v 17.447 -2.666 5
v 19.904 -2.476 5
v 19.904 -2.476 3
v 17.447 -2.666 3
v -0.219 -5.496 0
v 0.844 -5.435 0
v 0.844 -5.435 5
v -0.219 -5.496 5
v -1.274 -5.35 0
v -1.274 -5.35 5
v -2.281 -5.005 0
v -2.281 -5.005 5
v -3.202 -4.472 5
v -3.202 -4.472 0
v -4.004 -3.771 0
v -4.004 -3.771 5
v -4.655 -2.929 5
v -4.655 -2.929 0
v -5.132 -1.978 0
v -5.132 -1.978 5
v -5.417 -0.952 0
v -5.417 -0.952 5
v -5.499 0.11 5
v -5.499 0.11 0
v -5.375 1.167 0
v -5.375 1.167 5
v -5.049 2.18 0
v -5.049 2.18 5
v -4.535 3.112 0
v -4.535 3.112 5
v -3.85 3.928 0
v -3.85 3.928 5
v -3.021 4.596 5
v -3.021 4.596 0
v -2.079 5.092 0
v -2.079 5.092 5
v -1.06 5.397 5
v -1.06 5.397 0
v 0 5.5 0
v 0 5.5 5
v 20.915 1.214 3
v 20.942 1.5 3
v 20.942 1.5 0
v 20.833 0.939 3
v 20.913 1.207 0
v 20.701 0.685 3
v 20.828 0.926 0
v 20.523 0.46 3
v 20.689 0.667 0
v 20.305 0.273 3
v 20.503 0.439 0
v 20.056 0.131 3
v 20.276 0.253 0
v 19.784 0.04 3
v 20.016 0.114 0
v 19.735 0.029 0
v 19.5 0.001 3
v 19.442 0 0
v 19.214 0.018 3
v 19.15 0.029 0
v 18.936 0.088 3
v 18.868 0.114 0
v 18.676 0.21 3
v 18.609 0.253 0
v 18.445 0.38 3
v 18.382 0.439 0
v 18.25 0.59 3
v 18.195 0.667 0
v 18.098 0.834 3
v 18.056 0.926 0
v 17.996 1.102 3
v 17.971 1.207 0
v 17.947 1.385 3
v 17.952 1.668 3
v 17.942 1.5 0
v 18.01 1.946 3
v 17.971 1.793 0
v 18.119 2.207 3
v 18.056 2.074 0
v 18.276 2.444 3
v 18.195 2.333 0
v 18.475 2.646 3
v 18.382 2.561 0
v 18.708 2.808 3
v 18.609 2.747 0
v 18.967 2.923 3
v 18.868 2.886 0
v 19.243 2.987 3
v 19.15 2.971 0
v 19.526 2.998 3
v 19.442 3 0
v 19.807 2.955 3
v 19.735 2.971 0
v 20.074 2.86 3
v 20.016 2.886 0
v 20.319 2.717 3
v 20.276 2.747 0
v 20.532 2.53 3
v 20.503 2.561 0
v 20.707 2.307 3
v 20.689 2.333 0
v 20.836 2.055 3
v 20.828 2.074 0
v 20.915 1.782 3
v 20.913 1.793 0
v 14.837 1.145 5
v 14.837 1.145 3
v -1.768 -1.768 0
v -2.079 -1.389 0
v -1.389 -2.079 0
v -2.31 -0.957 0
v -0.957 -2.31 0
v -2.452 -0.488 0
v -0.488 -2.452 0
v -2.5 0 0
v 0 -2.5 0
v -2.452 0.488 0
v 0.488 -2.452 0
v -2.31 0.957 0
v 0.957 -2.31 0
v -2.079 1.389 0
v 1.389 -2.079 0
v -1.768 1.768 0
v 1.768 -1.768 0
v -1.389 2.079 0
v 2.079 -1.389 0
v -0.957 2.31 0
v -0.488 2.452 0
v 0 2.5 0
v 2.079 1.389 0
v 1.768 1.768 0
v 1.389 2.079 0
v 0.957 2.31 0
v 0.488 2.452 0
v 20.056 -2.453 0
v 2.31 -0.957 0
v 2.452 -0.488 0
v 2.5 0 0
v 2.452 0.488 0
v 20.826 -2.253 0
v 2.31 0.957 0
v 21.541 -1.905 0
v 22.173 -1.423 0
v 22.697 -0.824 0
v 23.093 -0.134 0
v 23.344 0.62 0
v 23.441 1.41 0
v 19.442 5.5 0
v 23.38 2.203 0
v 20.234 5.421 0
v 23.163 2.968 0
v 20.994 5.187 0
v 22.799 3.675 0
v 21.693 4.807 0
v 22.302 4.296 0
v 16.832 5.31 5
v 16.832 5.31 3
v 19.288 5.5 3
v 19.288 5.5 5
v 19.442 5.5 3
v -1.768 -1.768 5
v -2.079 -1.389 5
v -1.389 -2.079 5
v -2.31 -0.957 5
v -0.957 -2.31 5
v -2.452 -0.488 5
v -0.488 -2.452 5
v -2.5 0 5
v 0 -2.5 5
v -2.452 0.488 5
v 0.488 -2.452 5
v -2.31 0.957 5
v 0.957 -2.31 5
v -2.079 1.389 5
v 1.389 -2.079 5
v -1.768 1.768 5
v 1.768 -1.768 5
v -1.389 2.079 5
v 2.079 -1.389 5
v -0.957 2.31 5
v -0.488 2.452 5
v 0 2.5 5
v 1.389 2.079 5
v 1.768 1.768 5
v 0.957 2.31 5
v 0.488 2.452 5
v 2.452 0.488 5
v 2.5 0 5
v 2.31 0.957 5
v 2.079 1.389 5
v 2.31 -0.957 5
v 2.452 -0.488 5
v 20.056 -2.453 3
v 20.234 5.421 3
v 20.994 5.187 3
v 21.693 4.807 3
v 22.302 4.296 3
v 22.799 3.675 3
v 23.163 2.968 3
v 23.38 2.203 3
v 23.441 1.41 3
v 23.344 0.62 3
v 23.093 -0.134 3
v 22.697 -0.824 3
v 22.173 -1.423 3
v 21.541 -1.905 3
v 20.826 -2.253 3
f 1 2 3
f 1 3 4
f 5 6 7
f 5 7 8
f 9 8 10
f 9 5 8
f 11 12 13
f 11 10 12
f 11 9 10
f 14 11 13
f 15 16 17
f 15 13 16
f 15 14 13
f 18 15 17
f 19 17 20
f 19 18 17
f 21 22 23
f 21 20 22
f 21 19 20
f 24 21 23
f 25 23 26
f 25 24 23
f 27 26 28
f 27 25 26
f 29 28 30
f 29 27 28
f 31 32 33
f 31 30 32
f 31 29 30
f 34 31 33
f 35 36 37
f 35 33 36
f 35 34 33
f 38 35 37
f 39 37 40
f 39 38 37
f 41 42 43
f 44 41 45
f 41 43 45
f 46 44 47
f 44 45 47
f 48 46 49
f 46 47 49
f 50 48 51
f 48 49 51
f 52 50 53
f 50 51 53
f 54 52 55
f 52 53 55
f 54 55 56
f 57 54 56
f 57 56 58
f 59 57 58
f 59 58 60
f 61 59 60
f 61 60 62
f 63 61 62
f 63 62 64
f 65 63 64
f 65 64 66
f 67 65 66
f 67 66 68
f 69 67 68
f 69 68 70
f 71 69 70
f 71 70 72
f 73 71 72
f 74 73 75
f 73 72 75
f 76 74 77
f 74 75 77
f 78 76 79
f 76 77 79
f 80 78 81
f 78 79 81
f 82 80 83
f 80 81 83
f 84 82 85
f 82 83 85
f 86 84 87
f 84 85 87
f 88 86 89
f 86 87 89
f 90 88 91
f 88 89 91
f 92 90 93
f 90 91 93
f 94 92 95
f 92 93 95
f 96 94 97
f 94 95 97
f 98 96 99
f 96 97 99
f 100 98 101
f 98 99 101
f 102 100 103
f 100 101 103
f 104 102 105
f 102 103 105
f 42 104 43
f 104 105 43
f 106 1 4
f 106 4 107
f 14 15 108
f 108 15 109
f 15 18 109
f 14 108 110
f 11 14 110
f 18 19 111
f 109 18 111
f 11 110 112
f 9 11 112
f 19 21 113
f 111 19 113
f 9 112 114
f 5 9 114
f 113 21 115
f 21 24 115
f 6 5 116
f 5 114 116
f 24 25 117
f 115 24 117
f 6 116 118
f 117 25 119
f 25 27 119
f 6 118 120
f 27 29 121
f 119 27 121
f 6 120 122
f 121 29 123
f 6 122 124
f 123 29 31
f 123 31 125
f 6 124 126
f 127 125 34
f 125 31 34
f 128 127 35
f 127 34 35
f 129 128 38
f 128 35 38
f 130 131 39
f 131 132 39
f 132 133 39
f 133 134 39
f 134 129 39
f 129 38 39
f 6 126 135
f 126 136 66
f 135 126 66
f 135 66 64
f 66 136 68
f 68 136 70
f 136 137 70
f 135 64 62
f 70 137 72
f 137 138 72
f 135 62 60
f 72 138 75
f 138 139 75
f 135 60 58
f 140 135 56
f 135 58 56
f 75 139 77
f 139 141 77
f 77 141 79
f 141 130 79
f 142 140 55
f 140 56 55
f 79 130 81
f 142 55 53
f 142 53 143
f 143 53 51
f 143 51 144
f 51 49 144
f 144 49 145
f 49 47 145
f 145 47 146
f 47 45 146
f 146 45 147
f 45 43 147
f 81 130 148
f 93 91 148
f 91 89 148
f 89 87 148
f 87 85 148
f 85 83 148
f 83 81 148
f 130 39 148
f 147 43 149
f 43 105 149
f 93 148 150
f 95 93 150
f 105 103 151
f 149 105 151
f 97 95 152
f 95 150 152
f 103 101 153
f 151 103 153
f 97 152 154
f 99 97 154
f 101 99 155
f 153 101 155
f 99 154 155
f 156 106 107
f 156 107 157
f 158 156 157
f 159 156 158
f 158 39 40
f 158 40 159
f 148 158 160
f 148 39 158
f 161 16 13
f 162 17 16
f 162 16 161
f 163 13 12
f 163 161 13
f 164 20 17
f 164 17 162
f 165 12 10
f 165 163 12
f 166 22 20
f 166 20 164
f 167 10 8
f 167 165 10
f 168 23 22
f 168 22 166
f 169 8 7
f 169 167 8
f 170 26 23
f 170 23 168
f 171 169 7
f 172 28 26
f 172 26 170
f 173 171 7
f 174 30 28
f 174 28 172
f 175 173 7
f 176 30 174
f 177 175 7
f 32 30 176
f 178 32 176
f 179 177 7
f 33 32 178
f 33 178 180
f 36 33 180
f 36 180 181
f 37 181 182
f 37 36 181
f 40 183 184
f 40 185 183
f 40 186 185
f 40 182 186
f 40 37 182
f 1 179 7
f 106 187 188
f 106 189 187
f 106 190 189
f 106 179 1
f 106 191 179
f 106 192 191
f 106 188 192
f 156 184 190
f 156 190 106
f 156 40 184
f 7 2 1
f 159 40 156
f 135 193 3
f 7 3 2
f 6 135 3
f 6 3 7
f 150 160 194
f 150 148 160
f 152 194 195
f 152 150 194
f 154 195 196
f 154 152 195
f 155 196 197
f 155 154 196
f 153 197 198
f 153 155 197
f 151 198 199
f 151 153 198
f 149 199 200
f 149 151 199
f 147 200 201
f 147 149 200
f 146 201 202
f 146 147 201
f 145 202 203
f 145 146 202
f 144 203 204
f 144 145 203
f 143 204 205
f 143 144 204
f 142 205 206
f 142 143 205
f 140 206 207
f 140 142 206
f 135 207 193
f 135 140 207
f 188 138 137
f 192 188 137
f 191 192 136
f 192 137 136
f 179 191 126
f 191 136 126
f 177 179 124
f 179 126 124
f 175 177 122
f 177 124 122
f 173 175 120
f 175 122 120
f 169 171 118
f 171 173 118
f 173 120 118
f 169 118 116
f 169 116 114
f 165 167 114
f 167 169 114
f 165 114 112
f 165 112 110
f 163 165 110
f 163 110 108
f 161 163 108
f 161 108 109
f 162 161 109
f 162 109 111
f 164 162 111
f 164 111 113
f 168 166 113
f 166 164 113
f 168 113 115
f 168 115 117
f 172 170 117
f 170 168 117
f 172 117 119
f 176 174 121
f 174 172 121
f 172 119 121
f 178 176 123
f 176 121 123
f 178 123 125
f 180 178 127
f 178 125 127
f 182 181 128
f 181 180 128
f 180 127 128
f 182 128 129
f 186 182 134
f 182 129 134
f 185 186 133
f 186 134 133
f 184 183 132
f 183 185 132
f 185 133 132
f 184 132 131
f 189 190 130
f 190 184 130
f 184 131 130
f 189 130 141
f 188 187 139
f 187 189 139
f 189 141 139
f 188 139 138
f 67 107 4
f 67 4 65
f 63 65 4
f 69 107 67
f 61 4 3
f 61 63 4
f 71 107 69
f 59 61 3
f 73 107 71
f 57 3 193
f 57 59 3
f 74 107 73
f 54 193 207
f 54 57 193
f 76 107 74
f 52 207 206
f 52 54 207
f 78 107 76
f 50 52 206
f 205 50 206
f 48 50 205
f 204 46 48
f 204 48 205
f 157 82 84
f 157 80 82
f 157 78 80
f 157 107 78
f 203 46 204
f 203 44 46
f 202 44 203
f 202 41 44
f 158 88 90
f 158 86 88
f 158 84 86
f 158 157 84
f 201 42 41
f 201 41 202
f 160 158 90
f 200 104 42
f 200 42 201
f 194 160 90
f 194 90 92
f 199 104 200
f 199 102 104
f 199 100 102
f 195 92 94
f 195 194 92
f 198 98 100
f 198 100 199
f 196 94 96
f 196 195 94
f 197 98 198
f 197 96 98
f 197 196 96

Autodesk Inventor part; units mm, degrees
ref_plane "YZ Plane" through (0, 0, 0) normal (1, 0, 0) x (0, 1, 0)
ref_plane "XZ Plane" through (0, 0, 0) normal (0, 1, 0) x (-1, 0, 0)
ref_plane "XY Plane" through (0, 0, 0) normal (0, 0, 1) x (1, 0, 0)
sketch "Sketch1" plane through (0, 0, 0) normal (0, 0, 1) x (1, 0, 0)
  circle A0 centre (0, 0) radius 2.5
  circle A1 centre (0, 0) radius 5.5
  circle A2 centre (19.4422, 1.5) radius 1.5
  circle A3 centre (19.4422, 1.5) radius 4
  line L0 (0, 5.5) -> (19.4422, 5.5)
  line L1 (20.0558, -2.4527) -> (0.8436, -5.4349)
  point P0 (22.8922, -0.5243)
  dimension "d0" = 5
  dimension "d1" = 11
  dimension "d2" = 3
  dimension "d3" = 8
  dimension "d4" = 19.5
extrude "Extrusion1" add sketch "Sketch1" along normal blind 5
sketch "Sketch2" plane through (0, 0, 5) normal (0, 0, 1) x (1, 0, 0)
  circle A0 centre (19.4422, 1.5) radius 1.5 projected
  line L0 (24.0473, 1.8553) -> (22.0525, -2.3105)
  line L1 (22.0525, -2.3105) -> (17.4474, -2.6658)
  line L2 (17.4474, -2.6658) -> (14.8371, 1.1447)
  line L3 (14.8371, 1.1447) -> (16.832, 5.3105)
  line L4 (16.832, 5.3105) -> (21.4371, 5.6658)
  line L5 (21.4371, 5.6658) -> (24.0473, 1.8553)
  line L6 (0, 0) -> (19.4422, 1.5)
  dimension "d7" = 8
extrude "Extrusion2" cut sketch "Sketch2" against normal blind 2
properties part number "TA07" material "ABS Plastic"
